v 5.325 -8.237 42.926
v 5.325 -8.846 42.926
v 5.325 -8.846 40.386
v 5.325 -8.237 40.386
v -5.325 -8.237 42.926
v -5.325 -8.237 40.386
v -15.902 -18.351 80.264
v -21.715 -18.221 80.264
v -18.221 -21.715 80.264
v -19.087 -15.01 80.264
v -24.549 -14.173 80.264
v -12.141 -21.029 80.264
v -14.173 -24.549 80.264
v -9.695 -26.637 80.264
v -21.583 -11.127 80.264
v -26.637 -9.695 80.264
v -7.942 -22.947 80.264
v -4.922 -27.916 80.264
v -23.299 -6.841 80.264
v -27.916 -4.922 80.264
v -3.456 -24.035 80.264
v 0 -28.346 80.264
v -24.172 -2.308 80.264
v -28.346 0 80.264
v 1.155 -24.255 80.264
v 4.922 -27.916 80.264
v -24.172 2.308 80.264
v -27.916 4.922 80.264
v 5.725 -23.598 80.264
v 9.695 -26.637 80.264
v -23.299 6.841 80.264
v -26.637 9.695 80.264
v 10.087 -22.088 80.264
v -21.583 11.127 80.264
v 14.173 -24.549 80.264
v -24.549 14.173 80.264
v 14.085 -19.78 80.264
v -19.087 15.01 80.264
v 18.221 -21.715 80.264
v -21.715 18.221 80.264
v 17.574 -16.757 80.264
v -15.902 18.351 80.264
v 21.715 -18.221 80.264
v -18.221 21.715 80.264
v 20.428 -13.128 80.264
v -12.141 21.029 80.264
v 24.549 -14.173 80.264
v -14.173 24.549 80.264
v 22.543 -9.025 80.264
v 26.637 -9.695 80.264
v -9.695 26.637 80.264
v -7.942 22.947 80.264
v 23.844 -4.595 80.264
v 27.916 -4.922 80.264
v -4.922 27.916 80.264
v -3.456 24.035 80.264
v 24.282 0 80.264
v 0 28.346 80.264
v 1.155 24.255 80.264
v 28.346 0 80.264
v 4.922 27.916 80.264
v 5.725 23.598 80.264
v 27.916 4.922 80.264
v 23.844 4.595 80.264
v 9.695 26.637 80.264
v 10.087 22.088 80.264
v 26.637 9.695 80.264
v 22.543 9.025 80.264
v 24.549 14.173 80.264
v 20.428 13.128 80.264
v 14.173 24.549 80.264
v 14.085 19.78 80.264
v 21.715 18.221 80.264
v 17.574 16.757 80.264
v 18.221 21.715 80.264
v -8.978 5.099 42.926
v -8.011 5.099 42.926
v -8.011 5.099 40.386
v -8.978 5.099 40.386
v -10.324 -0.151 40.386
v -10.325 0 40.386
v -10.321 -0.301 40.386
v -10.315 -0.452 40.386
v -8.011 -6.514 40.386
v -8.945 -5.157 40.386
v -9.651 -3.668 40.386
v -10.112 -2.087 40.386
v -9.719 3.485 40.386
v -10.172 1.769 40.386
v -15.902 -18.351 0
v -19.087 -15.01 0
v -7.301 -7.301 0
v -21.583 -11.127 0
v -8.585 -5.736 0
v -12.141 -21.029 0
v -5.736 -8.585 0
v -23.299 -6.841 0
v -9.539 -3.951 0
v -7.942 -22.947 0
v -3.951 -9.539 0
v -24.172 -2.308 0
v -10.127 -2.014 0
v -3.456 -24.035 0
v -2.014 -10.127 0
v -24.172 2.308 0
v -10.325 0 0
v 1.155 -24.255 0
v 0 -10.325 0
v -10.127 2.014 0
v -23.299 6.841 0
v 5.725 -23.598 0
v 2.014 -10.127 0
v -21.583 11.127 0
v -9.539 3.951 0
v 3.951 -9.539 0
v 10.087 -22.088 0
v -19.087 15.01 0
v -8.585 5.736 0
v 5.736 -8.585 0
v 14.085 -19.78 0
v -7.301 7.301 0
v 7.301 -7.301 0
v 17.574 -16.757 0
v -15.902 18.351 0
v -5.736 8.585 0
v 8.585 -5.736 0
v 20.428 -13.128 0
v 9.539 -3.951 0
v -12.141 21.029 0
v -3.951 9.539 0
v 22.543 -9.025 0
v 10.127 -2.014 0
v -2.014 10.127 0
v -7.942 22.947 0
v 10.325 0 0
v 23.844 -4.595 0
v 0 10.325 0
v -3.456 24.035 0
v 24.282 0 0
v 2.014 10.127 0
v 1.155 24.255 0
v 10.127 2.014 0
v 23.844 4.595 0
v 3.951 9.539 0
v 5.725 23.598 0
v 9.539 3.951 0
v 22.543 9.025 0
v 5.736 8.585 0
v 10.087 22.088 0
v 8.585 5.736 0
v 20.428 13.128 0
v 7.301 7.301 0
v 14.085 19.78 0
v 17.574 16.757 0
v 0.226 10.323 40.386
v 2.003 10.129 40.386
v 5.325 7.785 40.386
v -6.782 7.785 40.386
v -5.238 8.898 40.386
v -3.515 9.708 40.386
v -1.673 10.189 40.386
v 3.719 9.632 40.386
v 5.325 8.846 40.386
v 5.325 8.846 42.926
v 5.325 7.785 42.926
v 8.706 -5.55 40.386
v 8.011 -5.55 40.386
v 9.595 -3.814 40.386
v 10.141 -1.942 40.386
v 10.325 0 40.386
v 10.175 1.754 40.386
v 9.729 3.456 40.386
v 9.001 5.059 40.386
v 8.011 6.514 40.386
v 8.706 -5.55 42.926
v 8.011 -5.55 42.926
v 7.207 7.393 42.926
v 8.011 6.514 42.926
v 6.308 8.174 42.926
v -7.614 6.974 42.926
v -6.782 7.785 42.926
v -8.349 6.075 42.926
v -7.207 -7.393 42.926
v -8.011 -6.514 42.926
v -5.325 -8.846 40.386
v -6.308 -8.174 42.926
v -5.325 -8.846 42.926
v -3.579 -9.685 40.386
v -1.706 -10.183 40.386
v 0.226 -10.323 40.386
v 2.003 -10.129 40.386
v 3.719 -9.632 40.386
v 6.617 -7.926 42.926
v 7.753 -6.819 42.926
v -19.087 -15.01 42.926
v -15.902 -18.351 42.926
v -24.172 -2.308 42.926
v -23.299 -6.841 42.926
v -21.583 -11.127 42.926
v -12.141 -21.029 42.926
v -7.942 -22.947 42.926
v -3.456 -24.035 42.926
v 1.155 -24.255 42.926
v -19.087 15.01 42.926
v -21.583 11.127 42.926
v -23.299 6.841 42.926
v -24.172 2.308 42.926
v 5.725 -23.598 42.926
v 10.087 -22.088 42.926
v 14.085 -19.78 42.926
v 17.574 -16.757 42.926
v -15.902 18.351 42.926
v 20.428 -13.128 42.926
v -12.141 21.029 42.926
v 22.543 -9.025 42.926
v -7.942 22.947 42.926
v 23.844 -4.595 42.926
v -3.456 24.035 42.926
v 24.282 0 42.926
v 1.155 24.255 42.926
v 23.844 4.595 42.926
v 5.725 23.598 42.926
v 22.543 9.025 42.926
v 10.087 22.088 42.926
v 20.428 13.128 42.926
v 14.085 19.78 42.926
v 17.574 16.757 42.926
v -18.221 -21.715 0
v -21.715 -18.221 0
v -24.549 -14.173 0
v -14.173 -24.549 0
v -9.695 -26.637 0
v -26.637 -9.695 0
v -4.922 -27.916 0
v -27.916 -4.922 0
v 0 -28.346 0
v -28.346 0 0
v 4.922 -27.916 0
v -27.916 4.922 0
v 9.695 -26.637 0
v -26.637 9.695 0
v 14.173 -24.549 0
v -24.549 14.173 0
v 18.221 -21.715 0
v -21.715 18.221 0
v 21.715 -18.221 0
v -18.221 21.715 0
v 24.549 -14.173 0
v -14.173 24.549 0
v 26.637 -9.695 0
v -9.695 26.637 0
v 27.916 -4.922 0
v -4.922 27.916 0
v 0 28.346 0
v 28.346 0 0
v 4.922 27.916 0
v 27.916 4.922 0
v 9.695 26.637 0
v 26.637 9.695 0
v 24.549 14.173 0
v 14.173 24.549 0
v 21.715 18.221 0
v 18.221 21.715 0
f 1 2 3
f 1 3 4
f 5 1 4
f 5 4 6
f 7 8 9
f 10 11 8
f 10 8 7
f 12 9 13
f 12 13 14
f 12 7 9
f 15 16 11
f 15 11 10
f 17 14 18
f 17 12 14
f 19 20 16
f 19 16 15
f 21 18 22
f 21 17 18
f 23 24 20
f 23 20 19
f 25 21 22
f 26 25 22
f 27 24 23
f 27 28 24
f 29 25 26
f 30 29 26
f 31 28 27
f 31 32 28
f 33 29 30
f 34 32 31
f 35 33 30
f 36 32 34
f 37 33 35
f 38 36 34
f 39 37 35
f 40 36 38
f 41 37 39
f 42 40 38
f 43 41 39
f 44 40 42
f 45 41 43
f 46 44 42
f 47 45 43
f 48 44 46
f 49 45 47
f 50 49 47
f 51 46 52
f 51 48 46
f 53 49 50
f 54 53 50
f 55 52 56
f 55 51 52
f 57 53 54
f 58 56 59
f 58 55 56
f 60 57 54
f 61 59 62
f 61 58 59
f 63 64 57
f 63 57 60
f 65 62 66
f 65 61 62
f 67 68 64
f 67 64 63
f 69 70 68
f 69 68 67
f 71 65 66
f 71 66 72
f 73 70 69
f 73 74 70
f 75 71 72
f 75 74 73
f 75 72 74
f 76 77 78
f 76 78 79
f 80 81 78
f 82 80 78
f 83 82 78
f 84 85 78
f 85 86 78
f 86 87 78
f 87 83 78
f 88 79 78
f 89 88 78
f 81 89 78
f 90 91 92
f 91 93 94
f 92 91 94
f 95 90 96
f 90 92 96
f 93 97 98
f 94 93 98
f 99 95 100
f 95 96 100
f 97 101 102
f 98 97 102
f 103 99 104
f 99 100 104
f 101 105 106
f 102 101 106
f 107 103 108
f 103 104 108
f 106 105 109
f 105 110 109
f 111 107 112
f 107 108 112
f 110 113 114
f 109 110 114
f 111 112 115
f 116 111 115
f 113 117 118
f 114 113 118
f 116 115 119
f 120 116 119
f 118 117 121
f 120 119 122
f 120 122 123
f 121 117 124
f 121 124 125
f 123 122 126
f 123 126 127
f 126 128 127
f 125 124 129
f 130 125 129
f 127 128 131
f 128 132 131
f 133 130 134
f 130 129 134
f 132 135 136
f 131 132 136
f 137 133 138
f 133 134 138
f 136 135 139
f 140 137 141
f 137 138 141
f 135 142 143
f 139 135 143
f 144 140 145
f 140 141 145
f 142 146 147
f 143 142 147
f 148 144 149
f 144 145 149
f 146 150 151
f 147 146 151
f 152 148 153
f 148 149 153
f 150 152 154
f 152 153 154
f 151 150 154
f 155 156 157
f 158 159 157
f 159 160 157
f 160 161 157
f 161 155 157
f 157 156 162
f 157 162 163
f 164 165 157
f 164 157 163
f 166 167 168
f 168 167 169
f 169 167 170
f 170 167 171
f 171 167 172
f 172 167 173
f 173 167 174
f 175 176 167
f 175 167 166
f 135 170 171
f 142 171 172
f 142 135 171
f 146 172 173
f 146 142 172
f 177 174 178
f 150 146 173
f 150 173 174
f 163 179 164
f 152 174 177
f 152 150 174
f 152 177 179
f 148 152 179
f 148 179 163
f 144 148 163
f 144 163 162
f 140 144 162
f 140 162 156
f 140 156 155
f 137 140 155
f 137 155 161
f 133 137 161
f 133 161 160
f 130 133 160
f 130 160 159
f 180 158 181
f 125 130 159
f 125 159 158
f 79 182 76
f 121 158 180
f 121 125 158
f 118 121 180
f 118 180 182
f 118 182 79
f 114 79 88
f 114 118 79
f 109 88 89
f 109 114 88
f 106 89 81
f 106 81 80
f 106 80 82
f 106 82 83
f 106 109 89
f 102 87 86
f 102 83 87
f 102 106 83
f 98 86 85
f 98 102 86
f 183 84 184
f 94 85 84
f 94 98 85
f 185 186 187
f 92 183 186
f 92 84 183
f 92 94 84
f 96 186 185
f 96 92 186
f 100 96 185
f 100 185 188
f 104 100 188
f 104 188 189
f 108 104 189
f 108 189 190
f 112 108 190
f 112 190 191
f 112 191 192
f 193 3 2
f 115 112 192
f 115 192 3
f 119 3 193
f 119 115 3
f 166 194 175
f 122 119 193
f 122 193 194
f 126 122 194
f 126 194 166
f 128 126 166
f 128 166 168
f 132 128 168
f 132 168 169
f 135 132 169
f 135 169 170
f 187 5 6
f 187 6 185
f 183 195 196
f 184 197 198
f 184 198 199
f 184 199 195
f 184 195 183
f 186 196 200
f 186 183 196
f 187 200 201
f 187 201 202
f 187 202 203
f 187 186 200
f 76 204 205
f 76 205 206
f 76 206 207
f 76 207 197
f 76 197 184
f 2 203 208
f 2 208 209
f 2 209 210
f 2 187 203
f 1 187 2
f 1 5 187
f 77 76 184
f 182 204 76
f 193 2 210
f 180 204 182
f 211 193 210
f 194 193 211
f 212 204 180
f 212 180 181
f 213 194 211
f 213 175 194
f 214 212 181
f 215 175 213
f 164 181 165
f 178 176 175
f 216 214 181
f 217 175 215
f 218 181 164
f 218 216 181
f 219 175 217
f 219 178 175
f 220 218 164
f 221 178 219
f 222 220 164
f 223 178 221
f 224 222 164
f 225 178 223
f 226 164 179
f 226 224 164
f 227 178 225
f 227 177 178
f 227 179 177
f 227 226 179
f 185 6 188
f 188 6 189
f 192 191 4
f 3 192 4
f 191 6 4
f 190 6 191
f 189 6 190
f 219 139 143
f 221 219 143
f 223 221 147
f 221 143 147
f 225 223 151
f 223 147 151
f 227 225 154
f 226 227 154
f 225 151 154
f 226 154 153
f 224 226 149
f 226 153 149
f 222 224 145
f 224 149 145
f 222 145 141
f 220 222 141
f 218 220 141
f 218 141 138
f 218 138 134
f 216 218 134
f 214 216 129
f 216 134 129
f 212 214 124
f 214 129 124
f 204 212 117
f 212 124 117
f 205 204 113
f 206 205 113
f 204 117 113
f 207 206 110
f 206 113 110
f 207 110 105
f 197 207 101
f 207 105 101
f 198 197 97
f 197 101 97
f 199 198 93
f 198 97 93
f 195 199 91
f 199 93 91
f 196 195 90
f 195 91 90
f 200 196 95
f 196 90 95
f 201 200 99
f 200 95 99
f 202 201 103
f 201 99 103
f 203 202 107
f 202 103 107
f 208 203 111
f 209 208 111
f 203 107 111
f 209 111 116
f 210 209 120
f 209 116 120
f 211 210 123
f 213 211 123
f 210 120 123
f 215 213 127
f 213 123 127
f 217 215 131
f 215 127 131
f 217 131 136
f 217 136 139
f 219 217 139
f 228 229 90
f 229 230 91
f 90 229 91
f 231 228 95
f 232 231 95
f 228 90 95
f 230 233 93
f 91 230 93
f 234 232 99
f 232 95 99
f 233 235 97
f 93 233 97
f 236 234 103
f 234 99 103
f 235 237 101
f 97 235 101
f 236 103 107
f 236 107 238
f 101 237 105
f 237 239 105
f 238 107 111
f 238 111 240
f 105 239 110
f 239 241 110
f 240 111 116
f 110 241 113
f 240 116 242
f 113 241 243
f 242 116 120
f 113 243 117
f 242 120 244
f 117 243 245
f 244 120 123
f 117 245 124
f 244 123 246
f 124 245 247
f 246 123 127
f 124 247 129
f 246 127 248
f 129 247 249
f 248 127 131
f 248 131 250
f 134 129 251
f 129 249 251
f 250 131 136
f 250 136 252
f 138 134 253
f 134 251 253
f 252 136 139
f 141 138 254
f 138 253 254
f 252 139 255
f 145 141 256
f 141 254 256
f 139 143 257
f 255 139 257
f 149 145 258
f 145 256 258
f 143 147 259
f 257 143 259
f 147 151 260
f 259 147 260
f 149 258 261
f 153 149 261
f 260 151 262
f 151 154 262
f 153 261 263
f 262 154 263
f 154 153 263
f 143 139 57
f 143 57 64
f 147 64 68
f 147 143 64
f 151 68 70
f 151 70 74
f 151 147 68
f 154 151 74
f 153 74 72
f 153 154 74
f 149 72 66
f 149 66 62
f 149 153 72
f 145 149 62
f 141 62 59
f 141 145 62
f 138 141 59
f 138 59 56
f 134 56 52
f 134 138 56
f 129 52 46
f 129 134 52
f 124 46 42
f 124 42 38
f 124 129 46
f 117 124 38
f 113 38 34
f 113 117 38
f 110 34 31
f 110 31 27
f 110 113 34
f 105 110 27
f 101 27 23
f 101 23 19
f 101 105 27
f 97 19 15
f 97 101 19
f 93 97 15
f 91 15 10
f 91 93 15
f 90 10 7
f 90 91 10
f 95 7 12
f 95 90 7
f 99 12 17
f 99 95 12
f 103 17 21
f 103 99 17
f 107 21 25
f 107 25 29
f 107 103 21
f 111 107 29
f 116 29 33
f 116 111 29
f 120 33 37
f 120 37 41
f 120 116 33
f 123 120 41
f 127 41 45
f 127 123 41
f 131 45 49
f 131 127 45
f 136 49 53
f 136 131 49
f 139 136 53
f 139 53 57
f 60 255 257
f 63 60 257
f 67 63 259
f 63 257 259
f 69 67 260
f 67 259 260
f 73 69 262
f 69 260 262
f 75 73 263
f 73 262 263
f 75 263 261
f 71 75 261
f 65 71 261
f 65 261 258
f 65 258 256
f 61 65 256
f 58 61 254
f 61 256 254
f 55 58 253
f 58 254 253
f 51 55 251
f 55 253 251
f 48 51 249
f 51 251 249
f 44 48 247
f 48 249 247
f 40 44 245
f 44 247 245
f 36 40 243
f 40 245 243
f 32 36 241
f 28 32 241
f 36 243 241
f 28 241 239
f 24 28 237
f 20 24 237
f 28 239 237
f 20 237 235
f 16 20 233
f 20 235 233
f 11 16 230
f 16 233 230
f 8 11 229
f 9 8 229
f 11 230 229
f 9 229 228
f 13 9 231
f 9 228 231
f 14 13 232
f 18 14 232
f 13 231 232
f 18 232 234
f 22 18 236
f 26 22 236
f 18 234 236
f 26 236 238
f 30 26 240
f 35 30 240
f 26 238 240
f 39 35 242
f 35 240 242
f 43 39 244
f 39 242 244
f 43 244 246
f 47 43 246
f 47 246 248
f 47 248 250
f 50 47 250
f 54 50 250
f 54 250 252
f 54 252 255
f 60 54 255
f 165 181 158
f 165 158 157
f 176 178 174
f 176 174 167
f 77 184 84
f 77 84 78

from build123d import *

# Parameters (mm, degrees)
F0_R     = 28.3464
F0_R_2   = 24.2824
F1_DEPTH = 80.264
F0_R_3   = 10.3251
F2_DEPTH = 42.926
F3_W     = 0.45157969
F3_H     = 0.45157969
F4_DEPTH = 2.54


with BuildPart() as f1:
    # F0 (on Top) → F1 (new body)
    with BuildSketch(Plane.XY):
        Circle(F0_R)
        Circle(F0_R_2, mode=Mode.SUBTRACT)
    extrude(amount=F1_DEPTH)


with BuildPart() as f2:
    # F0 (on Top) → F2 (new body)
    with BuildSketch(Plane.XY):
        Circle(F0_R_2)
        Circle(F0_R_3, mode=Mode.SUBTRACT)
    extrude(amount=F2_DEPTH)

    # F3 (on face) → F4 (join)
    with BuildSketch(Plane.XY.offset(42.926)):
        with BuildLine():
            Line((-0.225789845, 10.7890022919), (-0.225789845, 10.3226309125))
            ThreePointArc((-0.225789845, 10.3226309125), (0, 10.3251), (0.225789845, 10.3226309125))
            Line((0.225789845, 10.3226309125), (0.225789845, 10.7890022919))
            Line((0.225789845, 10.7890022919), (-0.225789845, 10.7890022919))
        make_face()
        with BuildLine():
            Line((0.225789845, 10.3226309125), (0.225789845, 7.7851))
            Line((0.225789845, 7.7851), (5.3247064352, 7.7851))
            Line((5.3247064352, 7.7851), (5.3247064352, 8.8461964363))
            ThreePointArc((5.3247064352, 8.8461964363), (2.871753285, 9.9176974687), (0.225789845, 10.3226309125))
        make_face()
        with BuildLine():
            Line((11.0147921368, 0), (10.3251, 0))
            ThreePointArc((10.3251, 0), (10.3226297305, -0.2258438779), (10.315220104, -0.45157969))
            Line((10.315220104, -0.45157969), (11.0147921368, -0.45157969))
            Line((11.0147921368, -0.45157969), (11.0147921368, 0))
        make_face()
        with BuildLine():
            Line((11.0147921368, -0.45157969), (10.315220104, -0.45157969))
            ThreePointArc((10.315220104, -0.45157969), (9.8465377689, -3.1069895359), (8.7063012269, -5.5504962802))
            Line((8.7063012269, -5.5504962802), (11.0147921368, -5.5504962802))
            Line((11.0147921368, -5.5504962802), (11.0147921368, -0.45157969))
        make_face()
        with BuildLine():
            Line((5.3247064352, -8.23667969), (0.225789845, -8.23667969))
            Line((0.225789845, -8.23667969), (0.225789845, -10.3226309125))
            ThreePointArc((0.225789845, -10.3226309125), (2.871753285, -9.9176974687), (5.3247064352, -8.8461964363))
            Line((5.3247064352, -8.8461964363), (5.3247064352, -8.23667969))
        make_face()
        with Locations((0, -11.0147921368)):
            Rectangle(F3_W, F3_H)
        with BuildLine():
            ThreePointArc((-8.010889845, -6.5140873422), (-9.6514287141, -3.6684620465), (-10.315220104, -0.45157969))
            Line((-10.315220104, -0.45157969), (-11.0147921368, -0.45157969))
            Line((-11.0147921368, -0.45157969), (-11.0147921368, -7.0081130458))
            Line((-11.0147921368, -7.0081130458), (-8.010889845, -7.0081130458))
            Line((-8.010889845, -7.0081130458), (-8.010889845, -6.5140873422))
        make_face()
        with BuildLine():
            Line((-8.010889845, 5.0989165902), (-8.9782369993, 5.0989165902))
            ThreePointArc((-8.9782369993, 5.0989165902), (-9.9827071692, 2.6369011328), (-10.3251, 0))
            Line((-10.3251, 0), (-8.010889845, 0))
            Line((-8.010889845, 0), (-8.010889845, 5.0989165902))
        make_face()
        with BuildLine():
            Line((-8.010889845, -0.45157969), (-10.315220104, -0.45157969))
            ThreePointArc((-10.315220104, -0.45157969), (-9.6514287141, -3.6684620465), (-8.010889845, -6.5140873422))
            Line((-8.010889845, -6.5140873422), (-8.010889845, -0.45157969))
        make_face()
        with BuildLine():
            Line((-8.010889845, 0), (-10.3251, 0))
            ThreePointArc((-10.3251, 0), (-10.3226297305, -0.2258438779), (-10.315220104, -0.45157969))
            Line((-10.315220104, -0.45157969), (-8.010889845, -0.45157969))
            Line((-8.010889845, -0.45157969), (-8.010889845, 0))
        make_face()
        with BuildLine():
            Line((10.3251, 0), (8.010889845, 0))
            Line((8.010889845, 0), (8.010889845, -0.45157969))
            Line((8.010889845, -0.45157969), (10.315220104, -0.45157969))
            ThreePointArc((10.315220104, -0.45157969), (10.3226297305, -0.2258438779), (10.3251, 0))
        make_face()
        with BuildLine():
            Line((10.315220104, -0.45157969), (8.010889845, -0.45157969))
            Line((8.010889845, -0.45157969), (8.010889845, -5.5504962802))
            Line((8.010889845, -5.5504962802), (8.7063012269, -5.5504962802))
            ThreePointArc((8.7063012269, -5.5504962802), (9.8465377689, -3.1069895359), (10.315220104, -0.45157969))
        make_face()
        with BuildLine():
            Line((8.010889845, 6.5140873422), (8.010889845, 0))
            Line((8.010889845, 0), (10.3251, 0))
            ThreePointArc((10.3251, 0), (9.7293609438, 3.4564758983), (8.010889845, 6.5140873422))
        make_face()
        with BuildLine():
            Line((-6.7823232008, 10.7890022919), (-6.7823232008, 7.7851))
            ThreePointArc((-6.7823232008, 7.7851), (-3.7266845719, 9.6290971597), (-0.225789845, 10.3226309125))
            Line((-0.225789845, 10.3226309125), (-0.225789845, 10.7890022919))
            Line((-0.225789845, 10.7890022919), (-6.7823232008, 10.7890022919))
        make_face()
        with BuildLine():
            ThreePointArc((-0.225789845, -10.3226309125), (-2.871753285, -9.9176974687), (-5.3247064352, -8.8461964363))
            Line((-5.3247064352, -8.8461964363), (-5.3247064352, -10.7890022919))
            Line((-5.3247064352, -10.7890022919), (-0.225789845, -10.7890022919))
            Line((-0.225789845, -10.7890022919), (-0.225789845, -10.3226309125))
        make_face()
        with BuildLine():
            ThreePointArc((0.225789845, -10.3226309125), (0, -10.3251), (-0.225789845, -10.3226309125))
            Line((-0.225789845, -10.3226309125), (-0.225789845, -10.7890022919))
            Line((-0.225789845, -10.7890022919), (0.225789845, -10.7890022919))
            Line((0.225789845, -10.7890022919), (0.225789845, -10.3226309125))
        make_face()
        with BuildLine():
            ThreePointArc((-0.225789845, 10.3226309125), (-3.7266845719, 9.6290971597), (-6.7823232008, 7.7851))
            Line((-6.7823232008, 7.7851), (-0.225789845, 7.7851))
            Line((-0.225789845, 7.7851), (-0.225789845, 10.3226309125))
        make_face()
        with BuildLine():
            Line((-0.225789845, 10.3226309125), (-0.225789845, 7.7851))
            Line((-0.225789845, 7.7851), (0.225789845, 7.7851))
            Line((0.225789845, 7.7851), (0.225789845, 10.3226309125))
            ThreePointArc((0.225789845, 10.3226309125), (0, 10.3251), (-0.225789845, 10.3226309125))
        make_face()
        with BuildLine():
            Line((0.225789845, -8.23667969), (-0.225789845, -8.23667969))
            Line((-0.225789845, -8.23667969), (-0.225789845, -10.3226309125))
            ThreePointArc((-0.225789845, -10.3226309125), (0, -10.3251), (0.225789845, -10.3226309125))
            Line((0.225789845, -10.3226309125), (0.225789845, -8.23667969))
        make_face()
        with BuildLine():
            Line((-0.225789845, -10.3226309125), (-0.225789845, -8.23667969))
            Line((-0.225789845, -8.23667969), (-5.3247064352, -8.23667969))
            Line((-5.3247064352, -8.23667969), (-5.3247064352, -8.8461964363))
            ThreePointArc((-5.3247064352, -8.8461964363), (-2.871753285, -9.9176974687), (-0.225789845, -10.3226309125))
        make_face()
    extrude(amount=-F4_DEPTH)


solid = Compound([f1.part, f2.part])
